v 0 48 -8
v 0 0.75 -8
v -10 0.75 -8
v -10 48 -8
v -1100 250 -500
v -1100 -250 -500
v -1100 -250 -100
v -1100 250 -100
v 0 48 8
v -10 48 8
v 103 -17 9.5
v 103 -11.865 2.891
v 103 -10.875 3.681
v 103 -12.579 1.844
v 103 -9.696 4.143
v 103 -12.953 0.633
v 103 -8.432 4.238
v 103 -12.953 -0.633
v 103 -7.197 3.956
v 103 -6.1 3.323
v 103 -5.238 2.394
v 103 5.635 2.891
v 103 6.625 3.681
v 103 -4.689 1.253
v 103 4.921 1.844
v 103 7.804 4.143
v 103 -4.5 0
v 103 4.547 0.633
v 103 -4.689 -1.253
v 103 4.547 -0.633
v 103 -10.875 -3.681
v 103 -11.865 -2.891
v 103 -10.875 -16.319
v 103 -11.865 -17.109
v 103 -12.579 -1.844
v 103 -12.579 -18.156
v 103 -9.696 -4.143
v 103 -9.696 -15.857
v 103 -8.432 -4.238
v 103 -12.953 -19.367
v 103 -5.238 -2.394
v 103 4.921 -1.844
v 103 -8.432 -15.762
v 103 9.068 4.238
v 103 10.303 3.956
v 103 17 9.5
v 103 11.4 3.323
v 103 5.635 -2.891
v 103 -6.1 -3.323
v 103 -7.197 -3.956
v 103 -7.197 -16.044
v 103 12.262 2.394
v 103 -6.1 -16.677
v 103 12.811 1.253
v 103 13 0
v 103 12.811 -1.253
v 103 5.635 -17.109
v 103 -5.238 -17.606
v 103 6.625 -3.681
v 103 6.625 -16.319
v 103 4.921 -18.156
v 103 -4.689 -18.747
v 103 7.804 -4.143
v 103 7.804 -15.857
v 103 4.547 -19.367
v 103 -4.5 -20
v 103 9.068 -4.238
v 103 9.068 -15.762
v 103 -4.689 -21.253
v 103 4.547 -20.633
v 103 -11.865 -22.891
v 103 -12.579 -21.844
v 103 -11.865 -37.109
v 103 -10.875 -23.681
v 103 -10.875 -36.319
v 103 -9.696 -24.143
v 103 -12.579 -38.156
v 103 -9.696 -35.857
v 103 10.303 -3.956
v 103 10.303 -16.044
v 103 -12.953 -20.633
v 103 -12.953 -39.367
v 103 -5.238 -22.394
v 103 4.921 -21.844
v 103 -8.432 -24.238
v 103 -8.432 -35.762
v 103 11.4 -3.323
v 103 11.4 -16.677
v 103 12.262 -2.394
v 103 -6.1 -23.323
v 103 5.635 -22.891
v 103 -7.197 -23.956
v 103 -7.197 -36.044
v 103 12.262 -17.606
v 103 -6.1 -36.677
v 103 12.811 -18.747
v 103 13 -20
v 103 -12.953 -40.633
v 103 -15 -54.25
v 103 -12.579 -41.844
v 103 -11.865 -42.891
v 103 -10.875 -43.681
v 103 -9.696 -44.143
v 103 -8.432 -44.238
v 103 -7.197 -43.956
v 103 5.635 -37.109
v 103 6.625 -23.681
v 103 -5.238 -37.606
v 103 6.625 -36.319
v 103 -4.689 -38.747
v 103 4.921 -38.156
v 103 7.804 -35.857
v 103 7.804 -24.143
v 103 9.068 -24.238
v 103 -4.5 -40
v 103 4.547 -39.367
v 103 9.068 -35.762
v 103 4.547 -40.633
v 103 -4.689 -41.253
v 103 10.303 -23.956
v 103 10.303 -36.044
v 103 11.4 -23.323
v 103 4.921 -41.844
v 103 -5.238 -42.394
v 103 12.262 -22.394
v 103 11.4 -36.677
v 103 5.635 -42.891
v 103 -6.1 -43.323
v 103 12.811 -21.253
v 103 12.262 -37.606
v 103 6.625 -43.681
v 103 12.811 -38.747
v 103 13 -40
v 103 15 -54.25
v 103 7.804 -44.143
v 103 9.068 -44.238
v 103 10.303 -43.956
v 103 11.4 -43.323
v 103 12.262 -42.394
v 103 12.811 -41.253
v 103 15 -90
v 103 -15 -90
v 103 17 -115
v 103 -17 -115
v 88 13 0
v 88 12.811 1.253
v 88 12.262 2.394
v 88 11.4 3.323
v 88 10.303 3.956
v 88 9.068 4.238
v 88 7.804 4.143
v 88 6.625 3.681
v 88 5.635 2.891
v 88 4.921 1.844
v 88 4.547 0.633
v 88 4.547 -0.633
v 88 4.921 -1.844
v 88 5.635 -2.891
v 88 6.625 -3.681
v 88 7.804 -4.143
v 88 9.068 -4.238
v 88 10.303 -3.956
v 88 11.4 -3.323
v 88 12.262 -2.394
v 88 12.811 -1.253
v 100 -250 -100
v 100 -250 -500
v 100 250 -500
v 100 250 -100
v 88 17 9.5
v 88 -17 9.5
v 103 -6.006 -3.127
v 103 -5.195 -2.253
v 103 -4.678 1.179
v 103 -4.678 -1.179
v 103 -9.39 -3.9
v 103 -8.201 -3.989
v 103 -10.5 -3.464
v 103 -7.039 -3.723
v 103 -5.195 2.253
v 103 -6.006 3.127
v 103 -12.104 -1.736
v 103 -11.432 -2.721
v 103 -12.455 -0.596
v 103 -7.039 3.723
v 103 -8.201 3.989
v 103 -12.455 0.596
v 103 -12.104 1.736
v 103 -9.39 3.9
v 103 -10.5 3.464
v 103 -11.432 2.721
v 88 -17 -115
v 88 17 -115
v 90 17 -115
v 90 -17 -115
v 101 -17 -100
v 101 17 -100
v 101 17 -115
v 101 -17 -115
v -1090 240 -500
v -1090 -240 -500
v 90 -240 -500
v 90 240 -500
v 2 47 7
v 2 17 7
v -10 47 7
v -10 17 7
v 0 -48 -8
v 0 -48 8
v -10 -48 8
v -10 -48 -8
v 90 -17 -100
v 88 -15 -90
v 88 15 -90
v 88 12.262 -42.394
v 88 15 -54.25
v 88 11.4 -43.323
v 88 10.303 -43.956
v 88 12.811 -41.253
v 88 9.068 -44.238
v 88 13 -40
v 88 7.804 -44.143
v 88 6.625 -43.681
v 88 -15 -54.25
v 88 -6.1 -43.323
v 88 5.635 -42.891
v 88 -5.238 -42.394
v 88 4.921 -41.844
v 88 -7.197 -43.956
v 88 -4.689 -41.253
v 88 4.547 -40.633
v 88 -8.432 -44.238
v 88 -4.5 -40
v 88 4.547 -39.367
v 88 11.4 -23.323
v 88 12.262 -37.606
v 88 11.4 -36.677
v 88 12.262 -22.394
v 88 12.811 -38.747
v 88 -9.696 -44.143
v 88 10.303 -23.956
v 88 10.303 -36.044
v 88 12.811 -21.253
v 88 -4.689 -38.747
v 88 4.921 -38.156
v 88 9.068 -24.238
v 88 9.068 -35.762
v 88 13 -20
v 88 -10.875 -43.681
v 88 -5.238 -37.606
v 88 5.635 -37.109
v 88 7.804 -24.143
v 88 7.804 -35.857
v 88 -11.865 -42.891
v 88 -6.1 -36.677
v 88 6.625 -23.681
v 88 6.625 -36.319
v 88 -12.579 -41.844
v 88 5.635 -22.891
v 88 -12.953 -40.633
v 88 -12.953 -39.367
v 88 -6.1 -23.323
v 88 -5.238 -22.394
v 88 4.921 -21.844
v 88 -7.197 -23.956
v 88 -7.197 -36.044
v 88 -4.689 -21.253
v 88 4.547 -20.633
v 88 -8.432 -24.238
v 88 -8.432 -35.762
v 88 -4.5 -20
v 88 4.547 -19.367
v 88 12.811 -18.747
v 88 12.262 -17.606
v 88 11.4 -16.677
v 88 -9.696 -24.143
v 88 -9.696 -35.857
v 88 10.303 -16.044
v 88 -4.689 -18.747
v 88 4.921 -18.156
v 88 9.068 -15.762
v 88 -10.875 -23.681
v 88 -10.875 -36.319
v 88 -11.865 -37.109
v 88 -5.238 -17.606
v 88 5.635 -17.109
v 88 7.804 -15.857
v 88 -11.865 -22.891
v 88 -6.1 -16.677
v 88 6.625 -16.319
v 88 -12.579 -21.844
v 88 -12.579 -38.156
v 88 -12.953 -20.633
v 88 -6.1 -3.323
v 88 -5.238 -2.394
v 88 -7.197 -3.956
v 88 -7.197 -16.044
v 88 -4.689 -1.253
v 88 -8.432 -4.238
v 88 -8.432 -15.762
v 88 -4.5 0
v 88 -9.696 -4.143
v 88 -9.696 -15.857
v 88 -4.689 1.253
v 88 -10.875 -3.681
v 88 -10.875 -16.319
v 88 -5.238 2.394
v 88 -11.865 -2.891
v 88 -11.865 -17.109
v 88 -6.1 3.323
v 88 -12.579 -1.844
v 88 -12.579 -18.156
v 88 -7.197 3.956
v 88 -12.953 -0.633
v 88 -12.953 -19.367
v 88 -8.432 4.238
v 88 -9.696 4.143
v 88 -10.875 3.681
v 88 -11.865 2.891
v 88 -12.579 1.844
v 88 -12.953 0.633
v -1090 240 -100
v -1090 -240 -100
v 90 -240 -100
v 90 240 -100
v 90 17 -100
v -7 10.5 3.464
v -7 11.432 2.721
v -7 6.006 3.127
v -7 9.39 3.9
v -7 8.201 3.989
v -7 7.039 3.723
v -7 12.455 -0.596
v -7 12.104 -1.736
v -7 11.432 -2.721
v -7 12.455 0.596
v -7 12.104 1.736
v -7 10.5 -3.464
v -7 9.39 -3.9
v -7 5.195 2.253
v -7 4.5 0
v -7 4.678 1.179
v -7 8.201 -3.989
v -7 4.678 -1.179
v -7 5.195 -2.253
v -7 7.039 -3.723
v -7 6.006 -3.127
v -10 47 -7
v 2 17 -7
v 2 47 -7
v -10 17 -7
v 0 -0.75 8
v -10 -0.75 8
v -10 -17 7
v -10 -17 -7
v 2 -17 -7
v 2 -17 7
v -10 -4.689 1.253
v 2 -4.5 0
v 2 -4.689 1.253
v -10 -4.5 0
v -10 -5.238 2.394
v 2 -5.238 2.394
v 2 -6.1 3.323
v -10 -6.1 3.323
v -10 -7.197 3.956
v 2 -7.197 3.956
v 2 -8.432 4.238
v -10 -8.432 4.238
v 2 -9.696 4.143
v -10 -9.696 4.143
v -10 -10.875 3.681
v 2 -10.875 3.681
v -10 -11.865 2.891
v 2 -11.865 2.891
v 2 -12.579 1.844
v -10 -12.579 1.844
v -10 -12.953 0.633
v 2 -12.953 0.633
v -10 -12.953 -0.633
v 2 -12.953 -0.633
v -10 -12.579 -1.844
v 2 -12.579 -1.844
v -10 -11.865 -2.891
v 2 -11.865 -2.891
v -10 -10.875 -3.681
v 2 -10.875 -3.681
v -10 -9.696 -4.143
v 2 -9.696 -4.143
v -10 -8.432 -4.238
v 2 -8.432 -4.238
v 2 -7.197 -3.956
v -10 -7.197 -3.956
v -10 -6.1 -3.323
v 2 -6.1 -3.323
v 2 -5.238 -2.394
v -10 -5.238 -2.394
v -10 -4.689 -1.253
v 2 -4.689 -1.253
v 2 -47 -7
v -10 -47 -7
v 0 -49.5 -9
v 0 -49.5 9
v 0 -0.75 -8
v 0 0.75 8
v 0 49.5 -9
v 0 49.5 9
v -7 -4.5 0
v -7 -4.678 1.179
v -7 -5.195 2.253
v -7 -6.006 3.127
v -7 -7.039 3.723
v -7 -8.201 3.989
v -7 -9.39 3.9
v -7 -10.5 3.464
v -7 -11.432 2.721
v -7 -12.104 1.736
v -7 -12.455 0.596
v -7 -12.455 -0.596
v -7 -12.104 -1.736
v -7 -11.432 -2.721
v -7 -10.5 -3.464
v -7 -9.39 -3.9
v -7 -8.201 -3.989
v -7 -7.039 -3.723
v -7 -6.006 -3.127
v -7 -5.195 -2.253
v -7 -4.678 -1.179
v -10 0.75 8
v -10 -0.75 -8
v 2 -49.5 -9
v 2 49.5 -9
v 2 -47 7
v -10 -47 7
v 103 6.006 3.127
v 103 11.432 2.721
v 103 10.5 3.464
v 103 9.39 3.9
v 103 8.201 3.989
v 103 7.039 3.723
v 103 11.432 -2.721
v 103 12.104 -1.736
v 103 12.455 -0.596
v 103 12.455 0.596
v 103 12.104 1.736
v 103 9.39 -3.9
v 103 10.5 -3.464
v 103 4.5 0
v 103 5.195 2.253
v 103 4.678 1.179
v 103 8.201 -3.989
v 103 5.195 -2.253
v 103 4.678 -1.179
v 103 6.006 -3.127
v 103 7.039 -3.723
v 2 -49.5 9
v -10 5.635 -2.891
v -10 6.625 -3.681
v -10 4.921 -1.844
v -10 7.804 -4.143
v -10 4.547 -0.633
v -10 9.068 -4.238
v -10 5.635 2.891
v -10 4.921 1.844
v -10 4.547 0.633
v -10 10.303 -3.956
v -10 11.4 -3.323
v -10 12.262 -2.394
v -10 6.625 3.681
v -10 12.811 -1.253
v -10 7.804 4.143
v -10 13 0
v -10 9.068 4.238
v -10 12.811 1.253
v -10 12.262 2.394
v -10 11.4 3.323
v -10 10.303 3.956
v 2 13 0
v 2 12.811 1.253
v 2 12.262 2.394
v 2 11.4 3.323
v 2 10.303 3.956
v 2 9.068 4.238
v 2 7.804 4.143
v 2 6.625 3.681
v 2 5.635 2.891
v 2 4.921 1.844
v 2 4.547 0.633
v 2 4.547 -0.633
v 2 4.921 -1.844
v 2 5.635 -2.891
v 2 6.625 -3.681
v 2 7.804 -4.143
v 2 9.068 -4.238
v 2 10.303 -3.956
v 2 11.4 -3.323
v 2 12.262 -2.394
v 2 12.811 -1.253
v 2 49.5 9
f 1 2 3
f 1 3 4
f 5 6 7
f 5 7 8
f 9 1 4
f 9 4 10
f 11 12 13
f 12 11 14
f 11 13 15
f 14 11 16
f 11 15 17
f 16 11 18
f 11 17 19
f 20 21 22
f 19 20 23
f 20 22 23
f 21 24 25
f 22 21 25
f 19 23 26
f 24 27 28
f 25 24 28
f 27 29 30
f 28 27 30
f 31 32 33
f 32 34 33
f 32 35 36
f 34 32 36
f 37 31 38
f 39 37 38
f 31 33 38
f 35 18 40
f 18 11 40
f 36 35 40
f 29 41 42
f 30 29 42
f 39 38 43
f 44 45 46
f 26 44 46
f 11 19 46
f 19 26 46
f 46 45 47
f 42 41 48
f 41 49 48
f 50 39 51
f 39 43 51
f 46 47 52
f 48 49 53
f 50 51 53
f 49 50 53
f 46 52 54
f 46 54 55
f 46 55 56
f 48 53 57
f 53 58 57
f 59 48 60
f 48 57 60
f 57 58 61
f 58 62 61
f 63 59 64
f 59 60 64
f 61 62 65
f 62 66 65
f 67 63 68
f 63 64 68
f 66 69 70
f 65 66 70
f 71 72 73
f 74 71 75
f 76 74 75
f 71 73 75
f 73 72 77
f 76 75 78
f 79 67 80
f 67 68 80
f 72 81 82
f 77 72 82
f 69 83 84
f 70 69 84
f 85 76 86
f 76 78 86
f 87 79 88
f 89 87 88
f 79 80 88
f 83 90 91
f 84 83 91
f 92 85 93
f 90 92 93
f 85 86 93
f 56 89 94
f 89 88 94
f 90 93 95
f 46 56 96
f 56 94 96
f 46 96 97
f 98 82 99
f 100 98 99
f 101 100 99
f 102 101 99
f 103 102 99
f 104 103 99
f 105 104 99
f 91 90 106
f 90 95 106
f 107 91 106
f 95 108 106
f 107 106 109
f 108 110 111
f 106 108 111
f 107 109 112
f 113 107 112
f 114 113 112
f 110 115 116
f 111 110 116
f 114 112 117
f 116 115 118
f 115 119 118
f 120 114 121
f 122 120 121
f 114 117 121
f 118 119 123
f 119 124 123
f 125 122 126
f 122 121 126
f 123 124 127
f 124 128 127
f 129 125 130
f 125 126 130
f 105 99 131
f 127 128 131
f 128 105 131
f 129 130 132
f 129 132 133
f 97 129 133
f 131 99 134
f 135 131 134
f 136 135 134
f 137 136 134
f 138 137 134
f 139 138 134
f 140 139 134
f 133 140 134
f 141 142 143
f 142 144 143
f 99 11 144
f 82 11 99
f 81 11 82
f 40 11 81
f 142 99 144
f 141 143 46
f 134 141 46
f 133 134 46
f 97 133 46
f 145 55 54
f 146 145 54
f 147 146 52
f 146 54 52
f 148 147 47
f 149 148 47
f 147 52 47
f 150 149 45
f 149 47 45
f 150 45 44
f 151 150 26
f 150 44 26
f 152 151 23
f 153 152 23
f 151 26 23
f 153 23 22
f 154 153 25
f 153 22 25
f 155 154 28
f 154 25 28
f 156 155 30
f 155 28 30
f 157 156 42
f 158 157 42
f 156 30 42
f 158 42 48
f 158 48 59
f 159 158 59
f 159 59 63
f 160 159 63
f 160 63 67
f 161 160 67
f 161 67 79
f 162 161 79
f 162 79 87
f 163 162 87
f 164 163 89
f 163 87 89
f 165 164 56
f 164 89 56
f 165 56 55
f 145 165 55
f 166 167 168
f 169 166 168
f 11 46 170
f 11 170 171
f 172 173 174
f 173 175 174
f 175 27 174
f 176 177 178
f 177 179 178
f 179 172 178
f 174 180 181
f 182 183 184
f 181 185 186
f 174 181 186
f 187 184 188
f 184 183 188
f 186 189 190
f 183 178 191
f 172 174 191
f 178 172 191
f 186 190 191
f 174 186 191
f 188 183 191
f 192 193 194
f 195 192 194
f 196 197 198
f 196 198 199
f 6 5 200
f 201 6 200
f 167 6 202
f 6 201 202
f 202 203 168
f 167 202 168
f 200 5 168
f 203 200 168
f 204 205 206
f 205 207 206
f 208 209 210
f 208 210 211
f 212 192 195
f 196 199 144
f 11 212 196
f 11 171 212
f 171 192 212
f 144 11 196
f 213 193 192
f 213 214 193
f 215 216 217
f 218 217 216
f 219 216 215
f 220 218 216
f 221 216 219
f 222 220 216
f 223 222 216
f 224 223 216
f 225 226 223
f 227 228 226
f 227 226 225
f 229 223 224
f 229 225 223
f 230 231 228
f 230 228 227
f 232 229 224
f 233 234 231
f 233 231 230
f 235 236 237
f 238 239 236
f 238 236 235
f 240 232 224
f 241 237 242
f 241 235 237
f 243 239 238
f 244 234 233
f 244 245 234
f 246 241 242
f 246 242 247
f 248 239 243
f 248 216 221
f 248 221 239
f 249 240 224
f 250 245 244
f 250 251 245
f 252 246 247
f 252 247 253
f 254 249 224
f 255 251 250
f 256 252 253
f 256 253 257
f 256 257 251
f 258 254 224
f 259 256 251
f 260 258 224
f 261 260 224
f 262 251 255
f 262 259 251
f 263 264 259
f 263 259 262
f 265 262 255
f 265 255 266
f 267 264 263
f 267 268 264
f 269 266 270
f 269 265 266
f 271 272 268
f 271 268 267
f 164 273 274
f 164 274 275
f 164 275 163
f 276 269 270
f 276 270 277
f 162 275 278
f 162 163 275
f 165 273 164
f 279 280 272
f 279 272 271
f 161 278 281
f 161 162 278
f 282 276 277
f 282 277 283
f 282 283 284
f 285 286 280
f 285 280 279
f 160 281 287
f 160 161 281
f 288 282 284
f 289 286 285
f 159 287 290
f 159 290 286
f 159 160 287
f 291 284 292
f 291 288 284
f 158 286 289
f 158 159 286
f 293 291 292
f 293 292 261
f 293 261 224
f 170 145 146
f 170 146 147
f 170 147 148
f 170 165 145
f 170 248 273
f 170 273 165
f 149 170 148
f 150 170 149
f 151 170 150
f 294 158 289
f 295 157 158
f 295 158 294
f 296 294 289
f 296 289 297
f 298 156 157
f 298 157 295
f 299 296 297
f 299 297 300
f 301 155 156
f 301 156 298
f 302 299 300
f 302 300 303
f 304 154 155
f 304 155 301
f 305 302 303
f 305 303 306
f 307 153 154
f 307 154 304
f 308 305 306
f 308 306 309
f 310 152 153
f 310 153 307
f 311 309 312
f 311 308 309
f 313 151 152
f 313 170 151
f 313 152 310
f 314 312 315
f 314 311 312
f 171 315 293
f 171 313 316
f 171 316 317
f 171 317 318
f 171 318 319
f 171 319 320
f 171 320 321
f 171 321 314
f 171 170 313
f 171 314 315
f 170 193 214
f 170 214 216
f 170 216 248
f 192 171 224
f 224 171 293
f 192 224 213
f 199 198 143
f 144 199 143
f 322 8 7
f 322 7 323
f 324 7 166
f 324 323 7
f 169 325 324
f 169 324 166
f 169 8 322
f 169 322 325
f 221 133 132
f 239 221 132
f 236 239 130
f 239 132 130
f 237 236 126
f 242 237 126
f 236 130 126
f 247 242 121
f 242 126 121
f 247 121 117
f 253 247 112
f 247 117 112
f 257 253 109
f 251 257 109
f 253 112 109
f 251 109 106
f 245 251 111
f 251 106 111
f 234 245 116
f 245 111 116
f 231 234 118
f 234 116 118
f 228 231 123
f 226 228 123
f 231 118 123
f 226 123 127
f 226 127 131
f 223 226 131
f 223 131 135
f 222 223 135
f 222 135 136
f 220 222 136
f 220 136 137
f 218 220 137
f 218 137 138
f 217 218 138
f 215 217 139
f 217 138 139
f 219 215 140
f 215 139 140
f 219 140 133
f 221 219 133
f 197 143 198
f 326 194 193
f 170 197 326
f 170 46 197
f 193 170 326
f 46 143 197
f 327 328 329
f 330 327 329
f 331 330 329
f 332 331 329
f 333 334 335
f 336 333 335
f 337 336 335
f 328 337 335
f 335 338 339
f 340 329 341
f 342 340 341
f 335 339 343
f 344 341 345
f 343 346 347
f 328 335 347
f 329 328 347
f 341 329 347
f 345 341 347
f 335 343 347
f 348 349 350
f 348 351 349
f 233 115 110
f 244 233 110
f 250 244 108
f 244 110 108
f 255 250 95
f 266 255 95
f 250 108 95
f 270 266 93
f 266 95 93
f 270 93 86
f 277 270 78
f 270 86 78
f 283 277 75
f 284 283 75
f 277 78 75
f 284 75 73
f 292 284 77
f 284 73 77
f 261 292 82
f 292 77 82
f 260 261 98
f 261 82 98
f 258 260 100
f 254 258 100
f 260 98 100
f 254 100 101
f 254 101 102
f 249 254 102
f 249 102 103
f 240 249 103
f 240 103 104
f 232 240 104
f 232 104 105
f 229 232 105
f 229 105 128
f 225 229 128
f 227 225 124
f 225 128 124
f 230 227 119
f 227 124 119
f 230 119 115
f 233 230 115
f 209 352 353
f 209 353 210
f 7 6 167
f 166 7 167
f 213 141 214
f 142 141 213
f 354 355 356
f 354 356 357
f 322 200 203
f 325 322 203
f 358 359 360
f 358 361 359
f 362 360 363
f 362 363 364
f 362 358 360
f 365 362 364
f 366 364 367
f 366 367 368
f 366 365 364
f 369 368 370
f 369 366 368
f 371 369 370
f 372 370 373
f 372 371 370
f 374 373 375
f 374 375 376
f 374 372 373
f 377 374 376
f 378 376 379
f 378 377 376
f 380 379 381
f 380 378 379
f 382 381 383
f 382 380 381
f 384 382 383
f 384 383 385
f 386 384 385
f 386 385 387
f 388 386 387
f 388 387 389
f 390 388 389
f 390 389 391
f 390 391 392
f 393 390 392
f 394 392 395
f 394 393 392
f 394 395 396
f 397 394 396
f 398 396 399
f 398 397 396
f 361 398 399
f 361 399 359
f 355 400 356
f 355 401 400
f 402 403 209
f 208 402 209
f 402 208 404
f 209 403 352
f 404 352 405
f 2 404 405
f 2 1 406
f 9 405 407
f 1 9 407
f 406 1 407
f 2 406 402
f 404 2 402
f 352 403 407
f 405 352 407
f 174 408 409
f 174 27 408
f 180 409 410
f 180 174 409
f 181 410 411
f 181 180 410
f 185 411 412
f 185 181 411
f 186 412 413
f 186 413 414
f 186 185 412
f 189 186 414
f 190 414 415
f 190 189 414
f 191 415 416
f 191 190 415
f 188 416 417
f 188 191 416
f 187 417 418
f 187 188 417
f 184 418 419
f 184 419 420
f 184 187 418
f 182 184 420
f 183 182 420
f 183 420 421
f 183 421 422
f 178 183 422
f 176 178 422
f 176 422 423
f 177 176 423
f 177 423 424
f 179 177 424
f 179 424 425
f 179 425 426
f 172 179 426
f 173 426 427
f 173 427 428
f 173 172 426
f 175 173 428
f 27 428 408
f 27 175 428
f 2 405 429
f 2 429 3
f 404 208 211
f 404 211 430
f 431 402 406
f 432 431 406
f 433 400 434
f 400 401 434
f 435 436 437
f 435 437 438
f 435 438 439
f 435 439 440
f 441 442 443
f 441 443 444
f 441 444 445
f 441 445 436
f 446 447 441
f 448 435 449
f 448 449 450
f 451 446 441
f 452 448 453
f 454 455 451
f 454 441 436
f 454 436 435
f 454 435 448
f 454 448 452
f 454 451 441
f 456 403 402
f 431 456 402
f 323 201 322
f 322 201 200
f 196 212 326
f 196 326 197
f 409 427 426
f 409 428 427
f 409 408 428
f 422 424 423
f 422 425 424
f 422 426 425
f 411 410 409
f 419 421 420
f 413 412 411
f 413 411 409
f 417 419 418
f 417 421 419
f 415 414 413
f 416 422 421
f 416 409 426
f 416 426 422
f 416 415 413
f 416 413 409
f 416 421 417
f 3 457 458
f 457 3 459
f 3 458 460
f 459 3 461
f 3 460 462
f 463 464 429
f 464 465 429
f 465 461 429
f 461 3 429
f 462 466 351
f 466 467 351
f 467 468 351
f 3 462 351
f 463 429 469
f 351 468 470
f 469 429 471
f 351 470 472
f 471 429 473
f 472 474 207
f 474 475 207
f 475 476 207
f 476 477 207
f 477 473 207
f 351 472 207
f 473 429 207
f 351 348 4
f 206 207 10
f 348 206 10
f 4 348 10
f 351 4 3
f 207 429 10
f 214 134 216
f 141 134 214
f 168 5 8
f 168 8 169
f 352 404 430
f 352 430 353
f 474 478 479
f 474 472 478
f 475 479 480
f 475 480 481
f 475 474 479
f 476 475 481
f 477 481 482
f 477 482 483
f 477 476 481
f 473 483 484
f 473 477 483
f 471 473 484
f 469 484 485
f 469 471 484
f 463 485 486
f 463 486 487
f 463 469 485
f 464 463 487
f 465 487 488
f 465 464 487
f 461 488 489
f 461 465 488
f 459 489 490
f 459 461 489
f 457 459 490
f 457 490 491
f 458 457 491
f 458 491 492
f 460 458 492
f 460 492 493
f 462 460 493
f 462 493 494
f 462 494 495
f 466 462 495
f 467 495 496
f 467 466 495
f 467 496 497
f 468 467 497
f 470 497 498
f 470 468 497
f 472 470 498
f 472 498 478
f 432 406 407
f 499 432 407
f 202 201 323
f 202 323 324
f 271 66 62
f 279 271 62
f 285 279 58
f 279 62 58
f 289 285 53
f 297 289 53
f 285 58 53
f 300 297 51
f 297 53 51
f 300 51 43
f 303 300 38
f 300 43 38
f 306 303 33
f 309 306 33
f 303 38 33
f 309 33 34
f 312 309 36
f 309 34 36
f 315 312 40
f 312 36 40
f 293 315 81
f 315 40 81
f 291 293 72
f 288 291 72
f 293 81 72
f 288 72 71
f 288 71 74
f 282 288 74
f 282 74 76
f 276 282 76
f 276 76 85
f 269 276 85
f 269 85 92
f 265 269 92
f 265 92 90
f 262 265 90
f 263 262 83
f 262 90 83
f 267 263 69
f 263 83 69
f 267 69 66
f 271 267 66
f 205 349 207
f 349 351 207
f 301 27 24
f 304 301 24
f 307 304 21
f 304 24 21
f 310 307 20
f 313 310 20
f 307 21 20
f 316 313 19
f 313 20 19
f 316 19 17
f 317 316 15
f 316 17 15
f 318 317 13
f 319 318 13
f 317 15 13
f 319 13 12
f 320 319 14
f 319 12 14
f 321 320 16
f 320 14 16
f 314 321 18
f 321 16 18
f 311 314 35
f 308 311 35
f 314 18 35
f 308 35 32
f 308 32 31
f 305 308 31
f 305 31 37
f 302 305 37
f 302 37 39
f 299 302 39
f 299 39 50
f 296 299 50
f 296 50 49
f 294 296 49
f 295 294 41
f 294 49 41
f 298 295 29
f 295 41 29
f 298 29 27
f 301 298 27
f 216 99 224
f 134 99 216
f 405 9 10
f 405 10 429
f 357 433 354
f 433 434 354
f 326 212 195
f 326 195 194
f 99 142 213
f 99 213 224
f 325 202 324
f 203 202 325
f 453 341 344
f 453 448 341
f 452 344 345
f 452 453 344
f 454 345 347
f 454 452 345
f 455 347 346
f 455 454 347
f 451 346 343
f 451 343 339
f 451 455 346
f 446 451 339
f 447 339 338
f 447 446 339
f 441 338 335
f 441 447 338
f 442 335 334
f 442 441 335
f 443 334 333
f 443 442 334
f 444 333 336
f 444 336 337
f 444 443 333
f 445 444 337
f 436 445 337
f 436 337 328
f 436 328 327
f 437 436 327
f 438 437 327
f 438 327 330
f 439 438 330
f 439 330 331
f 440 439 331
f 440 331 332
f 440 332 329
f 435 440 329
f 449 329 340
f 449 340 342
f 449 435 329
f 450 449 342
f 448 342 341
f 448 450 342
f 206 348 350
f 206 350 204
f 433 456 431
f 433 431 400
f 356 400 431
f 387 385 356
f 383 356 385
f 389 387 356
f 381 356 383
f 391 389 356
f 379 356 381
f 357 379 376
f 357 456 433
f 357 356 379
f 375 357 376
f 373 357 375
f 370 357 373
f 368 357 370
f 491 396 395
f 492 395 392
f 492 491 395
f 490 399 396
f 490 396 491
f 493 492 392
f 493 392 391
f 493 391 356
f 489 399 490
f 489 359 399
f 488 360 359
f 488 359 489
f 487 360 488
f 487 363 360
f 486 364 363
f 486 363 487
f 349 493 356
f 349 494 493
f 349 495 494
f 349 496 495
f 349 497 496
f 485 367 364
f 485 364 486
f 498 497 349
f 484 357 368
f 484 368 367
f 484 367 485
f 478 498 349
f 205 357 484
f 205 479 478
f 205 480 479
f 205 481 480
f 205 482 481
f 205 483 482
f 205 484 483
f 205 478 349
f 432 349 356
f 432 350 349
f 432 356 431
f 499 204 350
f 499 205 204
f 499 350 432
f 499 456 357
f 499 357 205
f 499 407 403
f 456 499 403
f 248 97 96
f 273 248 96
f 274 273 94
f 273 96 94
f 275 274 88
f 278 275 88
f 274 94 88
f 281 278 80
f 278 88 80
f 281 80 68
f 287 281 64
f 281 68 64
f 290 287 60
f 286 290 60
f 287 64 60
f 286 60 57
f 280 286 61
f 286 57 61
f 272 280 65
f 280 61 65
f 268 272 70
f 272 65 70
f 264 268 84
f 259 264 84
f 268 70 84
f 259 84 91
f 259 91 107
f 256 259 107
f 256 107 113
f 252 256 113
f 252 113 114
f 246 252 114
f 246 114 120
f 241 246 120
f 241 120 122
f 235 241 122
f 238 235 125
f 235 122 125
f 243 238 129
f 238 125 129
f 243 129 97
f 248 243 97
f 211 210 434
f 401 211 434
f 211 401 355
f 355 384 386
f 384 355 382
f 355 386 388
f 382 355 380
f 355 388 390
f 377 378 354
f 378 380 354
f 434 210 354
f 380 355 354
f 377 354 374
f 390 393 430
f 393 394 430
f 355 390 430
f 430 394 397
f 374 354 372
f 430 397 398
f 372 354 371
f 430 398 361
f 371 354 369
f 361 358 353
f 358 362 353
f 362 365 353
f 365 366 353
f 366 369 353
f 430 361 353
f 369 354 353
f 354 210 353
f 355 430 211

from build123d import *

# Parameters (mm, degrees)
F0_W          = 1.5
F0_H          = 1
F0_H_2        = 16
F0_R          = 4.25
F0_W_2        = 30
F0_H_3        = 14
F1_DEPTH      = 2
F2_DEPTH      = 10
F2_DEPTH_BACK = 2
F5_W          = 1200
F5_H          = 500
F5_W_2        = 1180
F5_H_2        = 480
F6_DEPTH      = 400
F7_W          = 10
F7_H          = 2
F7_W_2        = 1
F7_H_2        = 30
F8_DEPTH      = 10
F9_DEPTH      = 15
F10_R         = 4.25
F11_DEPTH     = 15
F12_W         = 110
F12_H         = 4


# Not quite as in the source:
# - a feature names something its author has since deleted; it is built from what else it names
# - the program builds the solid bodies; features that only make, move or delete a surface that nothing else refers to are left out


with BuildPart() as f1:
    # F0 (on Right) → F1 (new body)
    with BuildSketch(Plane.YZ):
        Polygon((-0.75, 9), (-49.5, 9), (-49.5, -9), (-0.75, -9), (-0.75, -8), (-13, -8), (-16, -8), (-48, -8), (-48, 8), (-16, 8), (-13, 8), (-0.75, 8), align=None)
        with Locations((0, 8.5)):
            Rectangle(F0_W, F0_H)
        Polygon((49.5, 9), (0.75, 9), (0.75, 8), (13, 8), (16, 8), (48, 8), (48, -8), (16, -8), (13, -8), (0.75, -8), (0.75, -9), (49.5, -9), align=None)
        with Locations((0, -8.5)):
            Rectangle(F0_W, F0_H)
        Rectangle(F0_W, F0_H_2)
        Polygon((13, 8), (0.75, 8), (0.75, -8), (13, -8), (16, -8), (48, -8), (48, 8), (16, 8), align=None)
        with Locations((8.75, 0)):
            Circle(F0_R, mode=Mode.SUBTRACT)
        with Locations((32, 0)):
            Rectangle(F0_W_2, F0_H_3, mode=Mode.SUBTRACT)
    extrude(amount=F1_DEPTH)

    # F0 (on Right) → F2 (join, two sides)
    with BuildSketch(Plane.YZ) as f2_sk:
        Polygon((-0.75, -8), (-0.75, 8), (-13, 8), (-16, 8), (-48, 8), (-48, -8), (-16, -8), (-13, -8), align=None)
        with Locations((-32, 0)):
            Rectangle(F0_W_2, F0_H_3, mode=Mode.SUBTRACT)
        with Locations((-8.75, 0)):
            Circle(F0_R, mode=Mode.SUBTRACT)
        Polygon((13, 8), (0.75, 8), (0.75, -8), (13, -8), (16, -8), (48, -8), (48, 8), (16, 8), align=None)
        with Locations((8.75, 0)):
            Circle(F0_R, mode=Mode.SUBTRACT)
        with Locations((32, 0)):
            Rectangle(F0_W_2, F0_H_3, mode=Mode.SUBTRACT)
    extrude(amount=-F2_DEPTH)
    extrude(f2_sk.sketch, amount=F2_DEPTH_BACK)


with BuildPart() as f6:
    # F5 (on offset) → F6 (new body)
    with BuildSketch(Plane.XY.offset(-500)):
        with Locations((-500, 0)):
            Rectangle(F5_W, F5_H)
        with Locations((-500, 0)):
            Rectangle(F5_W_2, F5_H_2, mode=Mode.SUBTRACT)
    extrude(amount=F6_DEPTH)


with BuildPart() as f8:
    # F7 (on face) → F8 (new body)
    with BuildSketch(Plane.XY.offset(-100)):
        Polygon((101, 17), (101, 15), (101, -15), (101, -17), (103, -17), (103, 17), align=None)
        Polygon((90, -15), (90, 15), (90, 17), (88, 17), (88, -17), (90, -17), align=None)
        with Locations((95, 16)):
            Rectangle(F7_W, F7_H)
        with Locations((100.5, 16)):
            Rectangle(F7_W_2, F7_H)
        with Locations((100.5, -16)):
            Rectangle(F7_W_2, F7_H)
        with Locations((95, -16)):
            Rectangle(F7_W, F7_H)
        with Locations((100.5, 0)):
            Rectangle(F7_W_2, F7_H_2)
        with Locations((95, 0)):
            Rectangle(F7_W, F7_H_2)
    extrude(amount=F8_DEPTH)

    # F7 (on face) → F9 (join)
    with BuildSketch(Plane.XY.offset(-100)):
        Polygon((90, -15), (90, 15), (90, 17), (88, 17), (88, -17), (90, -17), align=None)
        Polygon((101, 17), (101, 15), (101, -15), (101, -17), (103, -17), (103, 17), align=None)
    extrude(amount=-F9_DEPTH)

    # F10 (on face) → F11 (join)
    with BuildSketch(Plane.YZ.offset(103)):
        Polygon((-15, -90), (-17, -90), (-17, -100), (17, -100), (17, -90), (15, -90), align=None)
        Polygon((-17, 9.5), (-17, -90), (-15, -90), (-15, -54.25), (15, -54.25), (15, -90), (17, -90), (17, 9.5), align=None)
        with Locations((-8.75, -40)):
            Circle(F10_R, mode=Mode.SUBTRACT)
        with Locations((-8.75, -20)):
            Circle(F10_R, mode=Mode.SUBTRACT)
        with Locations((-8.75, 0)):
            Circle(F10_R, mode=Mode.SUBTRACT)
        with Locations((8.75, -40)):
            Circle(F10_R, mode=Mode.SUBTRACT)
        with Locations((8.75, -20)):
            Circle(F10_R, mode=Mode.SUBTRACT)
        with Locations((8.75, 0)):
            Circle(F10_R, mode=Mode.SUBTRACT)
    extrude(amount=-F11_DEPTH)


with BuildPart() as f13:
    # F12 (on Top) → F13 (revolve)
    with BuildSketch(Plane.XY):
        with Locations((48, -6.5)):
            Rectangle(F12_W, F12_H)
    revolve(axis=Axis((48, -8.5, 0), (1, 0, 0)))


with BuildPart() as f14:
    # F12 (on Top) → F14 (revolve)
    with BuildSketch(Plane.XY):
        with Locations((48, 6.5)):
            Rectangle(F12_W, F12_H)
    revolve(axis=Axis((48, 8.5, 0), (1, 0, 0)))


solid = Compound([f1.part, f6.part, f8.part, f13.part, f14.part])
